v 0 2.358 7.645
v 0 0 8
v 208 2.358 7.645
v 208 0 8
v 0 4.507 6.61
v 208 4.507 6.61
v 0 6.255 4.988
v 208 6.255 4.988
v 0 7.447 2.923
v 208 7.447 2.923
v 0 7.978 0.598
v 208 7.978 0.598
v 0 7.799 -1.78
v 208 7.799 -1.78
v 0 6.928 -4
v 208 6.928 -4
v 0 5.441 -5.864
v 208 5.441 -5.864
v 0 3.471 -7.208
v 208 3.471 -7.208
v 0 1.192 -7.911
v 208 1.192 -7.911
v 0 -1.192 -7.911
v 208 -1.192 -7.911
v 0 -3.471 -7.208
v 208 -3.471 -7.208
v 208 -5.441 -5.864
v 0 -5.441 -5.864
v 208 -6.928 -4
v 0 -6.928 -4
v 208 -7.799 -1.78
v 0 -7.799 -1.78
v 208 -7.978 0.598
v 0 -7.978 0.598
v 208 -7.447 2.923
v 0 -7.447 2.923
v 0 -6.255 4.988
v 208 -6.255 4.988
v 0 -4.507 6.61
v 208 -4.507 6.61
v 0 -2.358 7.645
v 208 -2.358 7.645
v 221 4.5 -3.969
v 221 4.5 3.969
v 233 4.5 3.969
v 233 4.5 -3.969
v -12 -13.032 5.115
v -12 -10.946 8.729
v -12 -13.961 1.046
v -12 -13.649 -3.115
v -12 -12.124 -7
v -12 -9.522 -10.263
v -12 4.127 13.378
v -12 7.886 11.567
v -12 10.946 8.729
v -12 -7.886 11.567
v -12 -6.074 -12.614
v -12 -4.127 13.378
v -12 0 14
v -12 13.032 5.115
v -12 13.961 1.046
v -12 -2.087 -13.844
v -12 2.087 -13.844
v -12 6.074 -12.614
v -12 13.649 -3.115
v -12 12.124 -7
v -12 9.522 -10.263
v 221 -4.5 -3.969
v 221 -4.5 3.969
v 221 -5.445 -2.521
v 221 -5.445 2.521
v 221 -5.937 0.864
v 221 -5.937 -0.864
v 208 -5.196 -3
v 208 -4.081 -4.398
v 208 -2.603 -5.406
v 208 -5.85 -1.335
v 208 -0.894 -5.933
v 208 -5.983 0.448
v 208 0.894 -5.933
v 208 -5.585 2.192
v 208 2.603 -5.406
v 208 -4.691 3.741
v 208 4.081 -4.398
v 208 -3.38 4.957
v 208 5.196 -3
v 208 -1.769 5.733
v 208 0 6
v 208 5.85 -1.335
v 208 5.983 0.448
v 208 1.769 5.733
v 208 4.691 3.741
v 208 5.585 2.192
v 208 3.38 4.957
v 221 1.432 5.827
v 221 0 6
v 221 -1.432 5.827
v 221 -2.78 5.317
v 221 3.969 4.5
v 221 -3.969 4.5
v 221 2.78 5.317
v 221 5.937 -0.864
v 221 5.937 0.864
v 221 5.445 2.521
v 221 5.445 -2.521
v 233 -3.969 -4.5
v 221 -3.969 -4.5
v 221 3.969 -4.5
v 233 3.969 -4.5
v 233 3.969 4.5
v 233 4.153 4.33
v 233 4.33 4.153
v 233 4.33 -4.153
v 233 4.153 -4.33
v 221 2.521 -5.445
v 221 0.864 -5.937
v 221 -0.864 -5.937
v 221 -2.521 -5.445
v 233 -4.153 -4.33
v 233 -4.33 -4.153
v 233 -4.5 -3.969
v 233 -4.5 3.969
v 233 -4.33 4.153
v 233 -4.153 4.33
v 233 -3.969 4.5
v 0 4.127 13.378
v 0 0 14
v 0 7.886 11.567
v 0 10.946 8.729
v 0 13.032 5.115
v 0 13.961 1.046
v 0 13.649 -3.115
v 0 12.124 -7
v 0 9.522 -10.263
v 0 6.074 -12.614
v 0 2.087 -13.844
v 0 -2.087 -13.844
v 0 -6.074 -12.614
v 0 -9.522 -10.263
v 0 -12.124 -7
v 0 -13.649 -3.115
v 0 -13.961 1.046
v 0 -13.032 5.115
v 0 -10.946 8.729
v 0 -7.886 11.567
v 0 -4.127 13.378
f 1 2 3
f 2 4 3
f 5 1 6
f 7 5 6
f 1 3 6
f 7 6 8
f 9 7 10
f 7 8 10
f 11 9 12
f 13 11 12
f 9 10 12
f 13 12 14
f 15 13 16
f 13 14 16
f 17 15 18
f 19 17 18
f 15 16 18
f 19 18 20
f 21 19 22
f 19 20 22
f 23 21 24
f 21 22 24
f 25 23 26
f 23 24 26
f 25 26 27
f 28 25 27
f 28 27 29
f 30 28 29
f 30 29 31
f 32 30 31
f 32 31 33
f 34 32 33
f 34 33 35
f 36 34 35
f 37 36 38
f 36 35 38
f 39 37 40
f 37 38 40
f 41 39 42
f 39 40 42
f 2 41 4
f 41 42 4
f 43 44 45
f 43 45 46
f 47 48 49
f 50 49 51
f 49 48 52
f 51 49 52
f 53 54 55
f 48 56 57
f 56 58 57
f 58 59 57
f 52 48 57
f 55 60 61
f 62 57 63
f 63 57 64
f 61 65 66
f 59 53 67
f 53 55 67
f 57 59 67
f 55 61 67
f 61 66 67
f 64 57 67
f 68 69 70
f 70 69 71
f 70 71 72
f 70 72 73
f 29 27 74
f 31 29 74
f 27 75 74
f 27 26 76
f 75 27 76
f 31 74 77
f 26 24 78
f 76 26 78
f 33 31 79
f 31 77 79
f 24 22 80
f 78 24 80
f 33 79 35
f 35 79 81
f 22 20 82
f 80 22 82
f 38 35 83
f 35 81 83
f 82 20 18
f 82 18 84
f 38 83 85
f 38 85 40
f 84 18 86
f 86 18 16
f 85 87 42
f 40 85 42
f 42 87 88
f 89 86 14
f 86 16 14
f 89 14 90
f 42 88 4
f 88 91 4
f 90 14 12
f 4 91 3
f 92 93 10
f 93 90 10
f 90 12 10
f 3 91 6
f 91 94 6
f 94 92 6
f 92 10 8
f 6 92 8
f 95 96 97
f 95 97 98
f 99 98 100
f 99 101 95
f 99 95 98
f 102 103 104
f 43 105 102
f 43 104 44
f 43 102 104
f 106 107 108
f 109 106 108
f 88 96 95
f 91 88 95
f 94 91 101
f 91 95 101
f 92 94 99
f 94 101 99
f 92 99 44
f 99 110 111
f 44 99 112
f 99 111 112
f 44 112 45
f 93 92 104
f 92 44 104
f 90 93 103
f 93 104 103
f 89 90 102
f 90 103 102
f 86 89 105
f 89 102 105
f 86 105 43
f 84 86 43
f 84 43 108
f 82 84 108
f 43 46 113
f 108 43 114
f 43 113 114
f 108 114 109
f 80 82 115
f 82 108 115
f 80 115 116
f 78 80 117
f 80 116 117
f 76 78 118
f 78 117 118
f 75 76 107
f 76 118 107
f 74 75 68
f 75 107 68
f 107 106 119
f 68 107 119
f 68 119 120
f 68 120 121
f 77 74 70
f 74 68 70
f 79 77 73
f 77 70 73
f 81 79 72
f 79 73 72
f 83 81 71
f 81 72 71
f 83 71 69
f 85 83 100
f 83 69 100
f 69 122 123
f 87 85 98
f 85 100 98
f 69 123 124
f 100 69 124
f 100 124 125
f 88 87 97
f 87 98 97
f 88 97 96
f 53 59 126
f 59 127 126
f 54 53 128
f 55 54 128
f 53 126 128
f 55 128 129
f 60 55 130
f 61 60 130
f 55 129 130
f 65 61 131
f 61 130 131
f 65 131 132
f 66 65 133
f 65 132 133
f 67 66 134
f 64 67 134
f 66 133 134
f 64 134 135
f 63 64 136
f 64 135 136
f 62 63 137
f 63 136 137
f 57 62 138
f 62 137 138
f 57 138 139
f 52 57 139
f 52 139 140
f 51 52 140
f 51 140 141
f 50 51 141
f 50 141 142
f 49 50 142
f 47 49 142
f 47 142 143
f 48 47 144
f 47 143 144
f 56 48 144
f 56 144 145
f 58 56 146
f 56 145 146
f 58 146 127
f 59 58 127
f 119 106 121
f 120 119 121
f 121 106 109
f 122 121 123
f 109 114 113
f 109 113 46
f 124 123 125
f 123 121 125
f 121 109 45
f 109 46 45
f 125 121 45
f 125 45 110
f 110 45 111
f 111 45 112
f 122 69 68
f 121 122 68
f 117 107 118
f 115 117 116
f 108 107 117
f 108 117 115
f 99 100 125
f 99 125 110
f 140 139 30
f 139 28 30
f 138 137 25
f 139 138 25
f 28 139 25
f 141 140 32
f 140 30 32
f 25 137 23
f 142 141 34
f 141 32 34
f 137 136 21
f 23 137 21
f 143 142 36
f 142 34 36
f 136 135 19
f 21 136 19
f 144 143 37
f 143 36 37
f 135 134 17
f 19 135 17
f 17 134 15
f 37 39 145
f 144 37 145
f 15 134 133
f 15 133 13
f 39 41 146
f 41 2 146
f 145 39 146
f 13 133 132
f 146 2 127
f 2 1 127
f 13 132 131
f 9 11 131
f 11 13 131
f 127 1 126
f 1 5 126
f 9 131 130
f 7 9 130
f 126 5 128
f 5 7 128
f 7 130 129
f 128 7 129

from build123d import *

# Parameters (mm, degrees)
SKETCH2_R          = 9
SKETCH2_W          = 9
SKETCH2_H          = 9
CUT_EXTRUDE1_DEPTH = 12


with BuildPart() as part:
    # Sketch1 → Revolve1 (revolve)
    with BuildSketch(Plane.XY, mode=Mode.PRIVATE) as revolve1_sk:
        Polygon((-12, 0), (-12, 14), (0, 14), (0, 8), (208, 8), (208, 6), (233, 6), (233, 0), align=None)
    revolve(revolve1_sk.sketch.rotate(Axis((500, 0, 0), (-1, 0, 0)), 270), axis=Axis((500, 0, 0), (-1, 0, 0)))

    # Sketch2 → Cut-Extrude1 (cut)
    with BuildSketch(Plane(origin=(221, 0, 0), x_dir=(0, 0, -1), z_dir=(1, 0, 0))):
        Circle(SKETCH2_R)
        Rectangle(SKETCH2_W, SKETCH2_H, mode=Mode.SUBTRACT)
    extrude(amount=CUT_EXTRUDE1_DEPTH, mode=Mode.SUBTRACT)


solid = part.part
